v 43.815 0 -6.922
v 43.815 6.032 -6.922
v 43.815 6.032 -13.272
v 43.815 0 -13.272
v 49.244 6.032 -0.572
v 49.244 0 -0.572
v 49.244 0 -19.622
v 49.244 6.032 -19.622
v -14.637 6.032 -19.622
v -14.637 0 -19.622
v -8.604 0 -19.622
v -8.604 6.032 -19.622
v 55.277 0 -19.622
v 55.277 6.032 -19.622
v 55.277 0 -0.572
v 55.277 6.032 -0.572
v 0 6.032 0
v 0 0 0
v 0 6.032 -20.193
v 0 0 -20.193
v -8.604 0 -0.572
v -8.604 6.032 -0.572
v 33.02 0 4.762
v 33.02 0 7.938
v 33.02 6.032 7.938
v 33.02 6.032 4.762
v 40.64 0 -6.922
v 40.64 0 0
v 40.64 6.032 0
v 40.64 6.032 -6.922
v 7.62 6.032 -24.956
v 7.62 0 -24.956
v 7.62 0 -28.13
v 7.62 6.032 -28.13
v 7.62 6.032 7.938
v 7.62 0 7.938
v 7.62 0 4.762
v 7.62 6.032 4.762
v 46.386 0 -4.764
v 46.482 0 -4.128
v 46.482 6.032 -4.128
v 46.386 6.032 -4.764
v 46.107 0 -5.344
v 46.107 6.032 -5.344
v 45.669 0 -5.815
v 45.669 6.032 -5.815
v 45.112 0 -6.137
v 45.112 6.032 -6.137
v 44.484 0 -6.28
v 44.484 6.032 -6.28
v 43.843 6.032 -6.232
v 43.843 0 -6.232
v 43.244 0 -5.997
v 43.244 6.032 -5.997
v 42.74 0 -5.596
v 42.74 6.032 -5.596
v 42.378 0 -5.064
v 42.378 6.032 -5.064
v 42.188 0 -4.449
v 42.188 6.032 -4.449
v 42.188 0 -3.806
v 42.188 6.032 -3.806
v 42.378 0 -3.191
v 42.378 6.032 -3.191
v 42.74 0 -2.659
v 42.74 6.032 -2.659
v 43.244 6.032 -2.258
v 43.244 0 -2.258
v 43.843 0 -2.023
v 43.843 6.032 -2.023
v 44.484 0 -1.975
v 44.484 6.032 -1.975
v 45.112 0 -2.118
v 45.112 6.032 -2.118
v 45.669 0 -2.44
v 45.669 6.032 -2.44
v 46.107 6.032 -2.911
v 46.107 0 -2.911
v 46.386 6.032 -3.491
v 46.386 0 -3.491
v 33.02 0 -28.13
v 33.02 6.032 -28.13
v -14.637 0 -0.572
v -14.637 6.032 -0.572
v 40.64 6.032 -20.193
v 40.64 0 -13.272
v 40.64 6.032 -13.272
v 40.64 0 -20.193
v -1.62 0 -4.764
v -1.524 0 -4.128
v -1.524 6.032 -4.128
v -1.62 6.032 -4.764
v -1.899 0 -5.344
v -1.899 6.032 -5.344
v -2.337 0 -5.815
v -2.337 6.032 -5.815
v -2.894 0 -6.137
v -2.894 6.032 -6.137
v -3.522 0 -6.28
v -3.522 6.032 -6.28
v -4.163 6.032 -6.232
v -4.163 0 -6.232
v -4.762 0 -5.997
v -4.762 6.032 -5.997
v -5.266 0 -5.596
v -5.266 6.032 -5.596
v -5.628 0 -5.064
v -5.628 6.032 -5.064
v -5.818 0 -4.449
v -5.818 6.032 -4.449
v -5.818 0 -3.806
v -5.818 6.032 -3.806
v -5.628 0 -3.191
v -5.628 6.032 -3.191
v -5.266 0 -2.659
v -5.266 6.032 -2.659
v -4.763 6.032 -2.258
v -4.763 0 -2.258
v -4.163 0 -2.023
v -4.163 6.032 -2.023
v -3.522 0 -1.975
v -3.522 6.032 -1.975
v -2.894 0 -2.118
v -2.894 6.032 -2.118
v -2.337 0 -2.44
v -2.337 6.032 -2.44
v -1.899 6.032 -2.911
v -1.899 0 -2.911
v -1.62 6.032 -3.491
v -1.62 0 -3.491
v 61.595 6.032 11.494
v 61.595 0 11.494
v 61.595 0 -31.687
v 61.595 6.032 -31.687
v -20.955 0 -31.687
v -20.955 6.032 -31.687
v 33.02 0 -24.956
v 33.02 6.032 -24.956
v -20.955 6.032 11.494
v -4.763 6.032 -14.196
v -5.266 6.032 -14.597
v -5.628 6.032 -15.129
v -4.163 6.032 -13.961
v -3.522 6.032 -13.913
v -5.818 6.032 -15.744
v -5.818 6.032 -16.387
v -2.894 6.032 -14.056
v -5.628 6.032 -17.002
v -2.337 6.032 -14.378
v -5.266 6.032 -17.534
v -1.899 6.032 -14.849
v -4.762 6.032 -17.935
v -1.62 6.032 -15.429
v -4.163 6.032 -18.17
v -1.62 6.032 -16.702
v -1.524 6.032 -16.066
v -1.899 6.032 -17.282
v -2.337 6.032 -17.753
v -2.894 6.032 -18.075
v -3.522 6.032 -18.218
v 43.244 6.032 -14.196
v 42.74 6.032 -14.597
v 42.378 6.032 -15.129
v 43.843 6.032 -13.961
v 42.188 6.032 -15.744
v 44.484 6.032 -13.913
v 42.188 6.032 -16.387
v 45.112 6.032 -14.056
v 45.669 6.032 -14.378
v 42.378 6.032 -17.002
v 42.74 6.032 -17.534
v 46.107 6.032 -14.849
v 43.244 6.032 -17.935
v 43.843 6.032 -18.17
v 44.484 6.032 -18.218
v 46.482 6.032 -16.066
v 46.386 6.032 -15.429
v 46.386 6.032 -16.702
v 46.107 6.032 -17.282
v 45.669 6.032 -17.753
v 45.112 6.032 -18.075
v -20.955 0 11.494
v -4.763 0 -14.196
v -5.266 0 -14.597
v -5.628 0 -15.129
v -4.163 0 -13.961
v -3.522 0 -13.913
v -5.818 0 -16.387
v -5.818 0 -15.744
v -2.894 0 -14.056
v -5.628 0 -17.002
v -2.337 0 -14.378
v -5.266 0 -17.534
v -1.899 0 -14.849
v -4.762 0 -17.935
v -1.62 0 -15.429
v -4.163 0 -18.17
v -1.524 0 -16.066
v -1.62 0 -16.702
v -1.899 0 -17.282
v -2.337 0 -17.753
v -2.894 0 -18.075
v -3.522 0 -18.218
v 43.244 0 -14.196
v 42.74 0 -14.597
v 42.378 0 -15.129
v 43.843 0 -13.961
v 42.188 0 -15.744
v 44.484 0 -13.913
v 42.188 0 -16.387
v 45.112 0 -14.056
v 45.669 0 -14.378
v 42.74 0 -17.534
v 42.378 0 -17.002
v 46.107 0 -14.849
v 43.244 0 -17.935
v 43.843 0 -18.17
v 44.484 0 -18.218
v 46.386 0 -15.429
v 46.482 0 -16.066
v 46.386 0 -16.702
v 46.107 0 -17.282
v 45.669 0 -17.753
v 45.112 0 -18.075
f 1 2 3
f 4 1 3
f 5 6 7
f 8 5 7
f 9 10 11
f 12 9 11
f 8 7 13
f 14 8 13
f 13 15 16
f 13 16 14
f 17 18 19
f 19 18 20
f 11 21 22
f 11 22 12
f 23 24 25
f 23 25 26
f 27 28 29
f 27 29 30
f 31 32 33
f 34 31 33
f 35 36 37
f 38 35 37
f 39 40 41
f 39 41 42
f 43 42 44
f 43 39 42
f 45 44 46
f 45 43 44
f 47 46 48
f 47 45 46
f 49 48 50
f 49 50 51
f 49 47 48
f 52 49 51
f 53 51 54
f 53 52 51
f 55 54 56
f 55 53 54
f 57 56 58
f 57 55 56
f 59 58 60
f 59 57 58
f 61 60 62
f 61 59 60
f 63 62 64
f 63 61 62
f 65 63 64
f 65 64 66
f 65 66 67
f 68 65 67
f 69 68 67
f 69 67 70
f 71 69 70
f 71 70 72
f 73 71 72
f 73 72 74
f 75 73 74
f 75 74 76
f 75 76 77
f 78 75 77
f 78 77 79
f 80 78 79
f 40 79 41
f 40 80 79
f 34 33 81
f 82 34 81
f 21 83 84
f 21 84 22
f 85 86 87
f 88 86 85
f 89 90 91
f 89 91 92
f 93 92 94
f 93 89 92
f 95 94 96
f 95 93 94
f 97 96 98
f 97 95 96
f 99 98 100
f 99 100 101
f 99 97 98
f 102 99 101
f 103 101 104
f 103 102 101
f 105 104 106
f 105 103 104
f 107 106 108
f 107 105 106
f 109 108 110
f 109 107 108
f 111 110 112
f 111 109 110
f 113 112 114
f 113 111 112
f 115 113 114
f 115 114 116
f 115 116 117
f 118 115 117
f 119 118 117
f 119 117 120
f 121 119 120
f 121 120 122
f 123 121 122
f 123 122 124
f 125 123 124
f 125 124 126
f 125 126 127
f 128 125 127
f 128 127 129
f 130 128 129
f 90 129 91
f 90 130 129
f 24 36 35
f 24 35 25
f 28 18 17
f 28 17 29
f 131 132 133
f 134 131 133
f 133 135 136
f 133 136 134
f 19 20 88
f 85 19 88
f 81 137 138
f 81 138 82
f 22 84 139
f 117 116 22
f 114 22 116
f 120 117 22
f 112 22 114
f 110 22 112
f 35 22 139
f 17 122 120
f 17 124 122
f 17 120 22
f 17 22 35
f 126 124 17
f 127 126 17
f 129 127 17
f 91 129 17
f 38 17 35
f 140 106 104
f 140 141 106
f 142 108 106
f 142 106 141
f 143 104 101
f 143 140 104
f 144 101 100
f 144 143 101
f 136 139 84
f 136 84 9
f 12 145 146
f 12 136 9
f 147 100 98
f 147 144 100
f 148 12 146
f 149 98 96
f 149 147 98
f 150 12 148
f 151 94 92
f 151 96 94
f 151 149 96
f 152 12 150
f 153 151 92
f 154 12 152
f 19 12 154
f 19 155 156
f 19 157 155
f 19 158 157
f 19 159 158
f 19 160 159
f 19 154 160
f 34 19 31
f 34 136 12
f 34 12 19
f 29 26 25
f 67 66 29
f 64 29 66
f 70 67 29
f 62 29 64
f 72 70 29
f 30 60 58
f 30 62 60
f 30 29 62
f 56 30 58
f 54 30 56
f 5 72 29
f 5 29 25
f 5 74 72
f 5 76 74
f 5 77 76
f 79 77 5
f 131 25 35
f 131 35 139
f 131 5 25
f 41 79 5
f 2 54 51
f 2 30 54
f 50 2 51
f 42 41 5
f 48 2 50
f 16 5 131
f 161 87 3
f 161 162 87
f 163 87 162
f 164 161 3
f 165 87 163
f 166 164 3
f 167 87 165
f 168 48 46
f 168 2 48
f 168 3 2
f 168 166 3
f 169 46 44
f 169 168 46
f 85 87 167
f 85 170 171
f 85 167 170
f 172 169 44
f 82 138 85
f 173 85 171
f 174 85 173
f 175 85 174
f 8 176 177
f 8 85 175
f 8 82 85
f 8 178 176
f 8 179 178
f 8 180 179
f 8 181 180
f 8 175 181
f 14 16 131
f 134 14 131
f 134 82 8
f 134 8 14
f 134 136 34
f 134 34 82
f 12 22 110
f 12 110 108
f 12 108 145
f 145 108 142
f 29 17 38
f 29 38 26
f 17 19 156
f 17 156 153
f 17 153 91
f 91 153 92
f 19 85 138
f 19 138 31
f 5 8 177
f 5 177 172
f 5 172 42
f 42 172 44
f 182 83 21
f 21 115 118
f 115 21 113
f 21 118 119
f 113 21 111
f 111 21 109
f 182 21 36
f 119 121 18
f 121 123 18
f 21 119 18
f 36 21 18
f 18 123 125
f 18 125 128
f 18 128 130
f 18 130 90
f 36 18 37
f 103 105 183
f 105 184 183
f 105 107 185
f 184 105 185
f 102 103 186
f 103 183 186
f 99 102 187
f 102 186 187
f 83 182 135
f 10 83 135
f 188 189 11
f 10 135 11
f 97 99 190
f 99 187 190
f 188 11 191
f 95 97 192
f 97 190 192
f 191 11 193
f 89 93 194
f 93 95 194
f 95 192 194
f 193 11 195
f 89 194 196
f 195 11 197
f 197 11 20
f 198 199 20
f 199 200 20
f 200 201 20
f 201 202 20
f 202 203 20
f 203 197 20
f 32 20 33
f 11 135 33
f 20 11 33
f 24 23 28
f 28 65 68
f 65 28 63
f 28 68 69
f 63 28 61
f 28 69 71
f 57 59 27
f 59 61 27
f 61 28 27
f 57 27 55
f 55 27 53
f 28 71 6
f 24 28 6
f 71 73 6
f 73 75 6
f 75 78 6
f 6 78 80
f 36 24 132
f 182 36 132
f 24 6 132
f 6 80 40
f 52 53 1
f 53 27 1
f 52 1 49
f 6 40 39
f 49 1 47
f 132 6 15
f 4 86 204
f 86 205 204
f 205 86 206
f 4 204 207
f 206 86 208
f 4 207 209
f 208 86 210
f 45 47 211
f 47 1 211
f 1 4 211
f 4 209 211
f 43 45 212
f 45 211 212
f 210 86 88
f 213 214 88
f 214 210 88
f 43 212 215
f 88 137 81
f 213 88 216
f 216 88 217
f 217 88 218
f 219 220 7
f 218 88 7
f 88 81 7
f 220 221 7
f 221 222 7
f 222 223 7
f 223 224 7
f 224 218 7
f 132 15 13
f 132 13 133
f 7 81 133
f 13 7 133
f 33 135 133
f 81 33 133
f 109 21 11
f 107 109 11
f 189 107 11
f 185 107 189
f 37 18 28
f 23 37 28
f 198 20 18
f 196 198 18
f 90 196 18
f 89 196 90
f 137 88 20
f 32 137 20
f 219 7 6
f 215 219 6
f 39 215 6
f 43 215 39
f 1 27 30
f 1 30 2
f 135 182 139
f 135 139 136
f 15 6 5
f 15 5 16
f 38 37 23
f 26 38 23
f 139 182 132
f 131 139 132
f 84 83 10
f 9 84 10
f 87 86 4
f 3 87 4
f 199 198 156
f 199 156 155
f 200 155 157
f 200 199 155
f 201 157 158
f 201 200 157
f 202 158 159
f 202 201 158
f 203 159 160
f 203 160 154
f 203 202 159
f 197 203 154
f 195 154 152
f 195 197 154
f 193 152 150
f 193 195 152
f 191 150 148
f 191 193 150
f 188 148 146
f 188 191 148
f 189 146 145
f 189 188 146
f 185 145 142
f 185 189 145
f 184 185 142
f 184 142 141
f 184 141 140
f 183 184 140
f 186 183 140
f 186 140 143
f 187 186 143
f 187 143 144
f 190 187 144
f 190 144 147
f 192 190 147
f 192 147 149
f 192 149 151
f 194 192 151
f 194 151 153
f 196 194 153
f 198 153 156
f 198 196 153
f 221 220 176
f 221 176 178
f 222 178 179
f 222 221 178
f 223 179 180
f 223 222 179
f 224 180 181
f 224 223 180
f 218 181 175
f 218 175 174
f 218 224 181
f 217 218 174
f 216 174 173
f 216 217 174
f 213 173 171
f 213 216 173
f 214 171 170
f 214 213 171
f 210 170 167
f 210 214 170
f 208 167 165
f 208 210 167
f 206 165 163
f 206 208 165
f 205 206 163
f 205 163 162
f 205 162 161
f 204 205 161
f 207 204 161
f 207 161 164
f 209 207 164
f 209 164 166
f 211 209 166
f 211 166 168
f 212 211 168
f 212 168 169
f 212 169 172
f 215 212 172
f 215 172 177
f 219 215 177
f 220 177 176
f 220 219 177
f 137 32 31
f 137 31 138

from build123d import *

# Parameters (mm, degrees)
SKETCH1_W           = 82.55
SKETCH1_H           = 43.18
SKETCH1_R           = 2.159
SKETCH1_W_2         = 40.64
SKETCH1_H_2         = 20.193
SKETCH1_W_3         = 25.4
SKETCH1_H_3         = 3.175
SKETCH1_W_4         = 6.0325
SKETCH1_H_4         = 19.05
BOSS_EXTRUDE1_DEPTH = 6.0325
SKETCH2_W           = 3.175
SKETCH2_H           = 6.35
CUT_EXTRUDE1_DEPTH  = 6.0325


with BuildPart() as part:
    # Sketch1 → Boss-Extrude1 (new body)
    with BuildSketch(Plane(origin=(0, 0, 0), x_dir=(1, 0, 0), z_dir=(0, 1, 0))):
        with Locations((20.32, 10.0965)):
            Rectangle(SKETCH1_W, SKETCH1_H)
        with Locations((44.323, 16.0655)):
            Circle(SKETCH1_R, mode=Mode.SUBTRACT)
        with Locations((44.323, 4.1275)):
            Circle(SKETCH1_R, mode=Mode.SUBTRACT)
        with Locations((-3.683, 4.1275)):
            Circle(SKETCH1_R, mode=Mode.SUBTRACT)
        with Locations((-3.683, 16.0655)):
            Circle(SKETCH1_R, mode=Mode.SUBTRACT)
        with Locations((20.32, 10.0965)):
            Rectangle(SKETCH1_W_2, SKETCH1_H_2, mode=Mode.SUBTRACT)
        with Locations((20.32, -6.35)):
            Rectangle(SKETCH1_W_3, SKETCH1_H_3, mode=Mode.SUBTRACT)
        with Locations((20.32, 26.543)):
            Rectangle(SKETCH1_W_3, SKETCH1_H_3, mode=Mode.SUBTRACT)
        with Locations((-11.6205, 10.0965)):
            Rectangle(SKETCH1_W_4, SKETCH1_H_4, mode=Mode.SUBTRACT)
        with Locations((52.2605, 10.0965)):
            Rectangle(SKETCH1_W_4, SKETCH1_H_4, mode=Mode.SUBTRACT)
    extrude(amount=BOSS_EXTRUDE1_DEPTH)

    # Sketch2 → Cut-Extrude1 (cut)
    with BuildSketch(Plane(origin=(0, 6.0325, 0), x_dir=(1, 0, 0), z_dir=(0, 1, 0))):
        with Locations((42.2275, 10.0965)):
            Rectangle(SKETCH2_W, SKETCH2_H)
    extrude(amount=-CUT_EXTRUDE1_DEPTH, mode=Mode.SUBTRACT)


solid = part.part
